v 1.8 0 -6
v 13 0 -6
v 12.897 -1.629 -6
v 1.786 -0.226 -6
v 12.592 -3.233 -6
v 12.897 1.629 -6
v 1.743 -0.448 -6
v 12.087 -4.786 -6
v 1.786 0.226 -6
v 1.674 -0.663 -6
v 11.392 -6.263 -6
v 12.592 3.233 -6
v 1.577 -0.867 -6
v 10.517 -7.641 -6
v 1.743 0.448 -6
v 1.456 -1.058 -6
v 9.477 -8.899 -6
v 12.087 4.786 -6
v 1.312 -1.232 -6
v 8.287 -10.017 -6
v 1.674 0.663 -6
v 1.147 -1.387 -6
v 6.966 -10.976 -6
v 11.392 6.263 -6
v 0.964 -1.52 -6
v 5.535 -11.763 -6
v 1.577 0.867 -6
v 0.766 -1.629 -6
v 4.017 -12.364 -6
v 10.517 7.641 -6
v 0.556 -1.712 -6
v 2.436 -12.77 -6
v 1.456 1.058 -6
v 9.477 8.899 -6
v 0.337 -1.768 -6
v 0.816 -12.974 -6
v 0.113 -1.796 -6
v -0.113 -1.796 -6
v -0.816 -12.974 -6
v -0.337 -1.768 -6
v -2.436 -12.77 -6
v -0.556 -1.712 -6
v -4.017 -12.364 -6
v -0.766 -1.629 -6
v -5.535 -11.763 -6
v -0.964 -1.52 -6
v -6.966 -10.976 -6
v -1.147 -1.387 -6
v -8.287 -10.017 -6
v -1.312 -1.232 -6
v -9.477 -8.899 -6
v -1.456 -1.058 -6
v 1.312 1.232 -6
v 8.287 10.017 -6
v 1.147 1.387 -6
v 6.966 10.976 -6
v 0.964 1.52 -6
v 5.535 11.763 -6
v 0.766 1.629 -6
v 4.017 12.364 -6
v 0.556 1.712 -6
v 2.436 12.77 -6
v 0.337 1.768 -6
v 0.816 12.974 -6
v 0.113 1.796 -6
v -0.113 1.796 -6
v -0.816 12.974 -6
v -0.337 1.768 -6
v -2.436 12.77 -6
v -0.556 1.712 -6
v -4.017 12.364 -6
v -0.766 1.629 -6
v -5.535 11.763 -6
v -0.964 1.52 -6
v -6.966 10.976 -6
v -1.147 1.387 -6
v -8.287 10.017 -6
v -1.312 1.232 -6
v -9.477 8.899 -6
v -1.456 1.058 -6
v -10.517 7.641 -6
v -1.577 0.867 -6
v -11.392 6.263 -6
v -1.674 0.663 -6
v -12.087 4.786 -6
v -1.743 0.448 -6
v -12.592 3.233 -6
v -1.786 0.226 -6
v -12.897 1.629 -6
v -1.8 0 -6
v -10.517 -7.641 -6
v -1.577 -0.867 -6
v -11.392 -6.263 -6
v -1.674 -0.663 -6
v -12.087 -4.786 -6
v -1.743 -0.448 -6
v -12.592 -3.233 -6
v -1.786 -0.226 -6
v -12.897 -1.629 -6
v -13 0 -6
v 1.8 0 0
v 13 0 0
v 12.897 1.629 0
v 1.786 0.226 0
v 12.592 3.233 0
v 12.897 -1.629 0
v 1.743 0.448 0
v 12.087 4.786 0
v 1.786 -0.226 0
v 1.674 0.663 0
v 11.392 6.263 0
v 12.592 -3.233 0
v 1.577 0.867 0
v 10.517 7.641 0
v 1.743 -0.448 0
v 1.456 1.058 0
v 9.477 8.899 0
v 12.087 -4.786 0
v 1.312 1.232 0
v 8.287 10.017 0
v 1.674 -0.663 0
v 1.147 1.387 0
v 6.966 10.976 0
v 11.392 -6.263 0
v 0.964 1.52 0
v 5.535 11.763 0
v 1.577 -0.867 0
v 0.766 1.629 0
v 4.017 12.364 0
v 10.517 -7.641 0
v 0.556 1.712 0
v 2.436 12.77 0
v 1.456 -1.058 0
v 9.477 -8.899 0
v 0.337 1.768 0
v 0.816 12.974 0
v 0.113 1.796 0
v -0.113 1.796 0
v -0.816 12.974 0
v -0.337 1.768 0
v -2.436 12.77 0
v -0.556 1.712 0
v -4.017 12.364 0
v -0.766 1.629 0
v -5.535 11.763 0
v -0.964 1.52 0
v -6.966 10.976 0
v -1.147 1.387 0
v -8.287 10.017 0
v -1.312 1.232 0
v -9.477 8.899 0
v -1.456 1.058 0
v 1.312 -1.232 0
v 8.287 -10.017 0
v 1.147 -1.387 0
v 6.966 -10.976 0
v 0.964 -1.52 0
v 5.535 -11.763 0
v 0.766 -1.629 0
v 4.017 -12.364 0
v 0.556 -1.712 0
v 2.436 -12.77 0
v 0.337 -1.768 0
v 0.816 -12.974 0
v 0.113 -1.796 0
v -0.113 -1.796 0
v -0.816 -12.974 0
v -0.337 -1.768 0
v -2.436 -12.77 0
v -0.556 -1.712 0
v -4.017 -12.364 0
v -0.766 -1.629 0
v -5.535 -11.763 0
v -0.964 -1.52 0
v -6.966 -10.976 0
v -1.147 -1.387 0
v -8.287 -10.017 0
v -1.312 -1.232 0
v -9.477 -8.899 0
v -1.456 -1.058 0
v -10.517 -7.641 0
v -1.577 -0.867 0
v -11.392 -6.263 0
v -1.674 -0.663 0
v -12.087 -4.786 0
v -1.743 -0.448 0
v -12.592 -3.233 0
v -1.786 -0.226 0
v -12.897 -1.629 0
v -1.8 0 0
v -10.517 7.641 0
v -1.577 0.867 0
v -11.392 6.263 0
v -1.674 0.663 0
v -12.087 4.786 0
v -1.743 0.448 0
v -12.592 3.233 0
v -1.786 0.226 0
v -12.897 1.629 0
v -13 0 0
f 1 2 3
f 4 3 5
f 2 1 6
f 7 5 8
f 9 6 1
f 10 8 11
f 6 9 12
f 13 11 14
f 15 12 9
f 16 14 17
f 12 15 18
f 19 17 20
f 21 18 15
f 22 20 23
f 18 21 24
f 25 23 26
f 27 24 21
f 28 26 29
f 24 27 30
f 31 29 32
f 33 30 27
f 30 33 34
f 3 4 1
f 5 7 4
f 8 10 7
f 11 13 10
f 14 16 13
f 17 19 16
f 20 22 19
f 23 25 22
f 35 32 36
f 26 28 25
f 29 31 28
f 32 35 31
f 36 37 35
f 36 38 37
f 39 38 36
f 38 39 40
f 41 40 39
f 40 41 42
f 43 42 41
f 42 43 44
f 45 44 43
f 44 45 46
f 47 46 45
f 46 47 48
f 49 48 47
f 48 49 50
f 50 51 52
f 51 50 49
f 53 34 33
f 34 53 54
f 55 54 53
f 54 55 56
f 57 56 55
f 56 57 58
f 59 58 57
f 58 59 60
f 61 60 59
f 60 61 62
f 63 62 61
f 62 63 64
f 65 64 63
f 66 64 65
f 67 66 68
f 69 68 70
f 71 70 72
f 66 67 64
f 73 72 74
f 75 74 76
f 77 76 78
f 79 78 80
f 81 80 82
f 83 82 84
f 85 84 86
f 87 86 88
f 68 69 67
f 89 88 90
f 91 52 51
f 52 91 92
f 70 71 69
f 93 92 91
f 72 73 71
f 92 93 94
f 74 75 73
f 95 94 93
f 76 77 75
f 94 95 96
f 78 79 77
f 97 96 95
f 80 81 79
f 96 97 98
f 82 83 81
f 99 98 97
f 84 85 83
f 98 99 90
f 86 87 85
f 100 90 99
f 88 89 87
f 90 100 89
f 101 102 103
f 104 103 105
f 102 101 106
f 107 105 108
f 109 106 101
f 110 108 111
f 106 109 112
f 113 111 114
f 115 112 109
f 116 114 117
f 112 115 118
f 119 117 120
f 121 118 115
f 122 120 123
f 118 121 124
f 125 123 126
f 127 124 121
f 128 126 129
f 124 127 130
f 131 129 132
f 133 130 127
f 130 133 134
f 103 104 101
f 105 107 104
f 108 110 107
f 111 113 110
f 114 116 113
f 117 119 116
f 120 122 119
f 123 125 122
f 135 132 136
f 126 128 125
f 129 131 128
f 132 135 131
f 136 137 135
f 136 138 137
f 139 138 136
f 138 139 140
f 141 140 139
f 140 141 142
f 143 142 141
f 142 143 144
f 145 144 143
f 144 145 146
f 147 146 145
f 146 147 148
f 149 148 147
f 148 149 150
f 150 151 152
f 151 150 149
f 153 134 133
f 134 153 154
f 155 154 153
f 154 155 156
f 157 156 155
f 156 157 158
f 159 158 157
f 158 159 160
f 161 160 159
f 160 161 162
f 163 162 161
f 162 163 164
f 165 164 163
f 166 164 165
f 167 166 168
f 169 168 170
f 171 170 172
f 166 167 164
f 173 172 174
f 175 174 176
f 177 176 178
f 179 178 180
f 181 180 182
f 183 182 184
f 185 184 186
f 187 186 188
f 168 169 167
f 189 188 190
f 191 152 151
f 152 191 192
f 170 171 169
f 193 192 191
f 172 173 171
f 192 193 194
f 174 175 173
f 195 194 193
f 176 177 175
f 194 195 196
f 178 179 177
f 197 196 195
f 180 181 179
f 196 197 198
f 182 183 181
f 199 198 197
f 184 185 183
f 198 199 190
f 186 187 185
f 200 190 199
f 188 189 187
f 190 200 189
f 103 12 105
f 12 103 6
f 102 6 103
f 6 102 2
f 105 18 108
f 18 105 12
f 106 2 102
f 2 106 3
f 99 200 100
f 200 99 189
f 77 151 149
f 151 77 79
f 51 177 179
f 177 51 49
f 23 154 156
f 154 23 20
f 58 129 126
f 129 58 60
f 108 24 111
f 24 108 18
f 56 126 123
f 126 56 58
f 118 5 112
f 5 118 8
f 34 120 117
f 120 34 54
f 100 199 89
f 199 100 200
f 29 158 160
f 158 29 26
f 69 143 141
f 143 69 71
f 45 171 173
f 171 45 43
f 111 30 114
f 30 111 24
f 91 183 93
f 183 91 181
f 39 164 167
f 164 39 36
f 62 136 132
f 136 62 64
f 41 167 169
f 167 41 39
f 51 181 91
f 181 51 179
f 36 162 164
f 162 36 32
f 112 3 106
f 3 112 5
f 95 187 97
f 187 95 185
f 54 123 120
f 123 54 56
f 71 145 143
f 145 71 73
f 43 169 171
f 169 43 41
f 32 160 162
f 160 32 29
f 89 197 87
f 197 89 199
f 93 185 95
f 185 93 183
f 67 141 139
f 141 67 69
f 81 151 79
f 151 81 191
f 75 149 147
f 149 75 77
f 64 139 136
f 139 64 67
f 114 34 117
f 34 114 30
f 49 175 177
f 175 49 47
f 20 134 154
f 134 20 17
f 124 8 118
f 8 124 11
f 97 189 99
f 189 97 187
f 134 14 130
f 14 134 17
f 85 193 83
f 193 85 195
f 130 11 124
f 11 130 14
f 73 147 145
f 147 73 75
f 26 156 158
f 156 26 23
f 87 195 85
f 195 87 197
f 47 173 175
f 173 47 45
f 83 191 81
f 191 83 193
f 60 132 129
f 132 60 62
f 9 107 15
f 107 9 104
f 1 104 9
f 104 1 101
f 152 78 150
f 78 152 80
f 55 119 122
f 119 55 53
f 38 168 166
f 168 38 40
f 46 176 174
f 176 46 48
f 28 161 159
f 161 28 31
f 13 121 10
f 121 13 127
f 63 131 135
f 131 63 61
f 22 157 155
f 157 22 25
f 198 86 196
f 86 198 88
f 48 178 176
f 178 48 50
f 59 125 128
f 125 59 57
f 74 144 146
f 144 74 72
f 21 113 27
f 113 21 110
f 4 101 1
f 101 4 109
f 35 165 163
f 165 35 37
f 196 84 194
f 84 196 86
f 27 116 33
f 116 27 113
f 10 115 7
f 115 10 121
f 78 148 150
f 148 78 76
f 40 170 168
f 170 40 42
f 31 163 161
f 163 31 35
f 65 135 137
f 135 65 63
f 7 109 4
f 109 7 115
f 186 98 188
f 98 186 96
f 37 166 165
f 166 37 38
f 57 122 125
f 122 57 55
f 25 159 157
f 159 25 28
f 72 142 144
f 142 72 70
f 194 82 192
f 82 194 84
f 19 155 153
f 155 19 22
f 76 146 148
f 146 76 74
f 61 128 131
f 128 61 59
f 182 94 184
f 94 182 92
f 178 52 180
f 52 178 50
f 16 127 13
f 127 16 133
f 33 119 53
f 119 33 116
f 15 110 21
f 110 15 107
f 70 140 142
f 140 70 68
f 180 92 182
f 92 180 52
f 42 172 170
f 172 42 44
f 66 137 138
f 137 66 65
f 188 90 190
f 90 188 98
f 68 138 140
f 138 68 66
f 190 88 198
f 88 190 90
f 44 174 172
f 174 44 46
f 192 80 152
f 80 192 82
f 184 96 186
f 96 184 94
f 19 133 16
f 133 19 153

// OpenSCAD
$fn = 50;


difference() {
	union() {
		translate(v = [0, 0, -6.0000000000]) {
			cylinder(h = 6, r = 10.0000000000);
		}
		translate(v = [0, 0, -6.0000000000]) {
			cylinder(h = 6, r = 13.0000000000);
		}
	}
	union() {
		#translate(v = [0, 0, -6]) {
			cylinder(h = 6, r = 1.8000000000);
		}
	}
}
